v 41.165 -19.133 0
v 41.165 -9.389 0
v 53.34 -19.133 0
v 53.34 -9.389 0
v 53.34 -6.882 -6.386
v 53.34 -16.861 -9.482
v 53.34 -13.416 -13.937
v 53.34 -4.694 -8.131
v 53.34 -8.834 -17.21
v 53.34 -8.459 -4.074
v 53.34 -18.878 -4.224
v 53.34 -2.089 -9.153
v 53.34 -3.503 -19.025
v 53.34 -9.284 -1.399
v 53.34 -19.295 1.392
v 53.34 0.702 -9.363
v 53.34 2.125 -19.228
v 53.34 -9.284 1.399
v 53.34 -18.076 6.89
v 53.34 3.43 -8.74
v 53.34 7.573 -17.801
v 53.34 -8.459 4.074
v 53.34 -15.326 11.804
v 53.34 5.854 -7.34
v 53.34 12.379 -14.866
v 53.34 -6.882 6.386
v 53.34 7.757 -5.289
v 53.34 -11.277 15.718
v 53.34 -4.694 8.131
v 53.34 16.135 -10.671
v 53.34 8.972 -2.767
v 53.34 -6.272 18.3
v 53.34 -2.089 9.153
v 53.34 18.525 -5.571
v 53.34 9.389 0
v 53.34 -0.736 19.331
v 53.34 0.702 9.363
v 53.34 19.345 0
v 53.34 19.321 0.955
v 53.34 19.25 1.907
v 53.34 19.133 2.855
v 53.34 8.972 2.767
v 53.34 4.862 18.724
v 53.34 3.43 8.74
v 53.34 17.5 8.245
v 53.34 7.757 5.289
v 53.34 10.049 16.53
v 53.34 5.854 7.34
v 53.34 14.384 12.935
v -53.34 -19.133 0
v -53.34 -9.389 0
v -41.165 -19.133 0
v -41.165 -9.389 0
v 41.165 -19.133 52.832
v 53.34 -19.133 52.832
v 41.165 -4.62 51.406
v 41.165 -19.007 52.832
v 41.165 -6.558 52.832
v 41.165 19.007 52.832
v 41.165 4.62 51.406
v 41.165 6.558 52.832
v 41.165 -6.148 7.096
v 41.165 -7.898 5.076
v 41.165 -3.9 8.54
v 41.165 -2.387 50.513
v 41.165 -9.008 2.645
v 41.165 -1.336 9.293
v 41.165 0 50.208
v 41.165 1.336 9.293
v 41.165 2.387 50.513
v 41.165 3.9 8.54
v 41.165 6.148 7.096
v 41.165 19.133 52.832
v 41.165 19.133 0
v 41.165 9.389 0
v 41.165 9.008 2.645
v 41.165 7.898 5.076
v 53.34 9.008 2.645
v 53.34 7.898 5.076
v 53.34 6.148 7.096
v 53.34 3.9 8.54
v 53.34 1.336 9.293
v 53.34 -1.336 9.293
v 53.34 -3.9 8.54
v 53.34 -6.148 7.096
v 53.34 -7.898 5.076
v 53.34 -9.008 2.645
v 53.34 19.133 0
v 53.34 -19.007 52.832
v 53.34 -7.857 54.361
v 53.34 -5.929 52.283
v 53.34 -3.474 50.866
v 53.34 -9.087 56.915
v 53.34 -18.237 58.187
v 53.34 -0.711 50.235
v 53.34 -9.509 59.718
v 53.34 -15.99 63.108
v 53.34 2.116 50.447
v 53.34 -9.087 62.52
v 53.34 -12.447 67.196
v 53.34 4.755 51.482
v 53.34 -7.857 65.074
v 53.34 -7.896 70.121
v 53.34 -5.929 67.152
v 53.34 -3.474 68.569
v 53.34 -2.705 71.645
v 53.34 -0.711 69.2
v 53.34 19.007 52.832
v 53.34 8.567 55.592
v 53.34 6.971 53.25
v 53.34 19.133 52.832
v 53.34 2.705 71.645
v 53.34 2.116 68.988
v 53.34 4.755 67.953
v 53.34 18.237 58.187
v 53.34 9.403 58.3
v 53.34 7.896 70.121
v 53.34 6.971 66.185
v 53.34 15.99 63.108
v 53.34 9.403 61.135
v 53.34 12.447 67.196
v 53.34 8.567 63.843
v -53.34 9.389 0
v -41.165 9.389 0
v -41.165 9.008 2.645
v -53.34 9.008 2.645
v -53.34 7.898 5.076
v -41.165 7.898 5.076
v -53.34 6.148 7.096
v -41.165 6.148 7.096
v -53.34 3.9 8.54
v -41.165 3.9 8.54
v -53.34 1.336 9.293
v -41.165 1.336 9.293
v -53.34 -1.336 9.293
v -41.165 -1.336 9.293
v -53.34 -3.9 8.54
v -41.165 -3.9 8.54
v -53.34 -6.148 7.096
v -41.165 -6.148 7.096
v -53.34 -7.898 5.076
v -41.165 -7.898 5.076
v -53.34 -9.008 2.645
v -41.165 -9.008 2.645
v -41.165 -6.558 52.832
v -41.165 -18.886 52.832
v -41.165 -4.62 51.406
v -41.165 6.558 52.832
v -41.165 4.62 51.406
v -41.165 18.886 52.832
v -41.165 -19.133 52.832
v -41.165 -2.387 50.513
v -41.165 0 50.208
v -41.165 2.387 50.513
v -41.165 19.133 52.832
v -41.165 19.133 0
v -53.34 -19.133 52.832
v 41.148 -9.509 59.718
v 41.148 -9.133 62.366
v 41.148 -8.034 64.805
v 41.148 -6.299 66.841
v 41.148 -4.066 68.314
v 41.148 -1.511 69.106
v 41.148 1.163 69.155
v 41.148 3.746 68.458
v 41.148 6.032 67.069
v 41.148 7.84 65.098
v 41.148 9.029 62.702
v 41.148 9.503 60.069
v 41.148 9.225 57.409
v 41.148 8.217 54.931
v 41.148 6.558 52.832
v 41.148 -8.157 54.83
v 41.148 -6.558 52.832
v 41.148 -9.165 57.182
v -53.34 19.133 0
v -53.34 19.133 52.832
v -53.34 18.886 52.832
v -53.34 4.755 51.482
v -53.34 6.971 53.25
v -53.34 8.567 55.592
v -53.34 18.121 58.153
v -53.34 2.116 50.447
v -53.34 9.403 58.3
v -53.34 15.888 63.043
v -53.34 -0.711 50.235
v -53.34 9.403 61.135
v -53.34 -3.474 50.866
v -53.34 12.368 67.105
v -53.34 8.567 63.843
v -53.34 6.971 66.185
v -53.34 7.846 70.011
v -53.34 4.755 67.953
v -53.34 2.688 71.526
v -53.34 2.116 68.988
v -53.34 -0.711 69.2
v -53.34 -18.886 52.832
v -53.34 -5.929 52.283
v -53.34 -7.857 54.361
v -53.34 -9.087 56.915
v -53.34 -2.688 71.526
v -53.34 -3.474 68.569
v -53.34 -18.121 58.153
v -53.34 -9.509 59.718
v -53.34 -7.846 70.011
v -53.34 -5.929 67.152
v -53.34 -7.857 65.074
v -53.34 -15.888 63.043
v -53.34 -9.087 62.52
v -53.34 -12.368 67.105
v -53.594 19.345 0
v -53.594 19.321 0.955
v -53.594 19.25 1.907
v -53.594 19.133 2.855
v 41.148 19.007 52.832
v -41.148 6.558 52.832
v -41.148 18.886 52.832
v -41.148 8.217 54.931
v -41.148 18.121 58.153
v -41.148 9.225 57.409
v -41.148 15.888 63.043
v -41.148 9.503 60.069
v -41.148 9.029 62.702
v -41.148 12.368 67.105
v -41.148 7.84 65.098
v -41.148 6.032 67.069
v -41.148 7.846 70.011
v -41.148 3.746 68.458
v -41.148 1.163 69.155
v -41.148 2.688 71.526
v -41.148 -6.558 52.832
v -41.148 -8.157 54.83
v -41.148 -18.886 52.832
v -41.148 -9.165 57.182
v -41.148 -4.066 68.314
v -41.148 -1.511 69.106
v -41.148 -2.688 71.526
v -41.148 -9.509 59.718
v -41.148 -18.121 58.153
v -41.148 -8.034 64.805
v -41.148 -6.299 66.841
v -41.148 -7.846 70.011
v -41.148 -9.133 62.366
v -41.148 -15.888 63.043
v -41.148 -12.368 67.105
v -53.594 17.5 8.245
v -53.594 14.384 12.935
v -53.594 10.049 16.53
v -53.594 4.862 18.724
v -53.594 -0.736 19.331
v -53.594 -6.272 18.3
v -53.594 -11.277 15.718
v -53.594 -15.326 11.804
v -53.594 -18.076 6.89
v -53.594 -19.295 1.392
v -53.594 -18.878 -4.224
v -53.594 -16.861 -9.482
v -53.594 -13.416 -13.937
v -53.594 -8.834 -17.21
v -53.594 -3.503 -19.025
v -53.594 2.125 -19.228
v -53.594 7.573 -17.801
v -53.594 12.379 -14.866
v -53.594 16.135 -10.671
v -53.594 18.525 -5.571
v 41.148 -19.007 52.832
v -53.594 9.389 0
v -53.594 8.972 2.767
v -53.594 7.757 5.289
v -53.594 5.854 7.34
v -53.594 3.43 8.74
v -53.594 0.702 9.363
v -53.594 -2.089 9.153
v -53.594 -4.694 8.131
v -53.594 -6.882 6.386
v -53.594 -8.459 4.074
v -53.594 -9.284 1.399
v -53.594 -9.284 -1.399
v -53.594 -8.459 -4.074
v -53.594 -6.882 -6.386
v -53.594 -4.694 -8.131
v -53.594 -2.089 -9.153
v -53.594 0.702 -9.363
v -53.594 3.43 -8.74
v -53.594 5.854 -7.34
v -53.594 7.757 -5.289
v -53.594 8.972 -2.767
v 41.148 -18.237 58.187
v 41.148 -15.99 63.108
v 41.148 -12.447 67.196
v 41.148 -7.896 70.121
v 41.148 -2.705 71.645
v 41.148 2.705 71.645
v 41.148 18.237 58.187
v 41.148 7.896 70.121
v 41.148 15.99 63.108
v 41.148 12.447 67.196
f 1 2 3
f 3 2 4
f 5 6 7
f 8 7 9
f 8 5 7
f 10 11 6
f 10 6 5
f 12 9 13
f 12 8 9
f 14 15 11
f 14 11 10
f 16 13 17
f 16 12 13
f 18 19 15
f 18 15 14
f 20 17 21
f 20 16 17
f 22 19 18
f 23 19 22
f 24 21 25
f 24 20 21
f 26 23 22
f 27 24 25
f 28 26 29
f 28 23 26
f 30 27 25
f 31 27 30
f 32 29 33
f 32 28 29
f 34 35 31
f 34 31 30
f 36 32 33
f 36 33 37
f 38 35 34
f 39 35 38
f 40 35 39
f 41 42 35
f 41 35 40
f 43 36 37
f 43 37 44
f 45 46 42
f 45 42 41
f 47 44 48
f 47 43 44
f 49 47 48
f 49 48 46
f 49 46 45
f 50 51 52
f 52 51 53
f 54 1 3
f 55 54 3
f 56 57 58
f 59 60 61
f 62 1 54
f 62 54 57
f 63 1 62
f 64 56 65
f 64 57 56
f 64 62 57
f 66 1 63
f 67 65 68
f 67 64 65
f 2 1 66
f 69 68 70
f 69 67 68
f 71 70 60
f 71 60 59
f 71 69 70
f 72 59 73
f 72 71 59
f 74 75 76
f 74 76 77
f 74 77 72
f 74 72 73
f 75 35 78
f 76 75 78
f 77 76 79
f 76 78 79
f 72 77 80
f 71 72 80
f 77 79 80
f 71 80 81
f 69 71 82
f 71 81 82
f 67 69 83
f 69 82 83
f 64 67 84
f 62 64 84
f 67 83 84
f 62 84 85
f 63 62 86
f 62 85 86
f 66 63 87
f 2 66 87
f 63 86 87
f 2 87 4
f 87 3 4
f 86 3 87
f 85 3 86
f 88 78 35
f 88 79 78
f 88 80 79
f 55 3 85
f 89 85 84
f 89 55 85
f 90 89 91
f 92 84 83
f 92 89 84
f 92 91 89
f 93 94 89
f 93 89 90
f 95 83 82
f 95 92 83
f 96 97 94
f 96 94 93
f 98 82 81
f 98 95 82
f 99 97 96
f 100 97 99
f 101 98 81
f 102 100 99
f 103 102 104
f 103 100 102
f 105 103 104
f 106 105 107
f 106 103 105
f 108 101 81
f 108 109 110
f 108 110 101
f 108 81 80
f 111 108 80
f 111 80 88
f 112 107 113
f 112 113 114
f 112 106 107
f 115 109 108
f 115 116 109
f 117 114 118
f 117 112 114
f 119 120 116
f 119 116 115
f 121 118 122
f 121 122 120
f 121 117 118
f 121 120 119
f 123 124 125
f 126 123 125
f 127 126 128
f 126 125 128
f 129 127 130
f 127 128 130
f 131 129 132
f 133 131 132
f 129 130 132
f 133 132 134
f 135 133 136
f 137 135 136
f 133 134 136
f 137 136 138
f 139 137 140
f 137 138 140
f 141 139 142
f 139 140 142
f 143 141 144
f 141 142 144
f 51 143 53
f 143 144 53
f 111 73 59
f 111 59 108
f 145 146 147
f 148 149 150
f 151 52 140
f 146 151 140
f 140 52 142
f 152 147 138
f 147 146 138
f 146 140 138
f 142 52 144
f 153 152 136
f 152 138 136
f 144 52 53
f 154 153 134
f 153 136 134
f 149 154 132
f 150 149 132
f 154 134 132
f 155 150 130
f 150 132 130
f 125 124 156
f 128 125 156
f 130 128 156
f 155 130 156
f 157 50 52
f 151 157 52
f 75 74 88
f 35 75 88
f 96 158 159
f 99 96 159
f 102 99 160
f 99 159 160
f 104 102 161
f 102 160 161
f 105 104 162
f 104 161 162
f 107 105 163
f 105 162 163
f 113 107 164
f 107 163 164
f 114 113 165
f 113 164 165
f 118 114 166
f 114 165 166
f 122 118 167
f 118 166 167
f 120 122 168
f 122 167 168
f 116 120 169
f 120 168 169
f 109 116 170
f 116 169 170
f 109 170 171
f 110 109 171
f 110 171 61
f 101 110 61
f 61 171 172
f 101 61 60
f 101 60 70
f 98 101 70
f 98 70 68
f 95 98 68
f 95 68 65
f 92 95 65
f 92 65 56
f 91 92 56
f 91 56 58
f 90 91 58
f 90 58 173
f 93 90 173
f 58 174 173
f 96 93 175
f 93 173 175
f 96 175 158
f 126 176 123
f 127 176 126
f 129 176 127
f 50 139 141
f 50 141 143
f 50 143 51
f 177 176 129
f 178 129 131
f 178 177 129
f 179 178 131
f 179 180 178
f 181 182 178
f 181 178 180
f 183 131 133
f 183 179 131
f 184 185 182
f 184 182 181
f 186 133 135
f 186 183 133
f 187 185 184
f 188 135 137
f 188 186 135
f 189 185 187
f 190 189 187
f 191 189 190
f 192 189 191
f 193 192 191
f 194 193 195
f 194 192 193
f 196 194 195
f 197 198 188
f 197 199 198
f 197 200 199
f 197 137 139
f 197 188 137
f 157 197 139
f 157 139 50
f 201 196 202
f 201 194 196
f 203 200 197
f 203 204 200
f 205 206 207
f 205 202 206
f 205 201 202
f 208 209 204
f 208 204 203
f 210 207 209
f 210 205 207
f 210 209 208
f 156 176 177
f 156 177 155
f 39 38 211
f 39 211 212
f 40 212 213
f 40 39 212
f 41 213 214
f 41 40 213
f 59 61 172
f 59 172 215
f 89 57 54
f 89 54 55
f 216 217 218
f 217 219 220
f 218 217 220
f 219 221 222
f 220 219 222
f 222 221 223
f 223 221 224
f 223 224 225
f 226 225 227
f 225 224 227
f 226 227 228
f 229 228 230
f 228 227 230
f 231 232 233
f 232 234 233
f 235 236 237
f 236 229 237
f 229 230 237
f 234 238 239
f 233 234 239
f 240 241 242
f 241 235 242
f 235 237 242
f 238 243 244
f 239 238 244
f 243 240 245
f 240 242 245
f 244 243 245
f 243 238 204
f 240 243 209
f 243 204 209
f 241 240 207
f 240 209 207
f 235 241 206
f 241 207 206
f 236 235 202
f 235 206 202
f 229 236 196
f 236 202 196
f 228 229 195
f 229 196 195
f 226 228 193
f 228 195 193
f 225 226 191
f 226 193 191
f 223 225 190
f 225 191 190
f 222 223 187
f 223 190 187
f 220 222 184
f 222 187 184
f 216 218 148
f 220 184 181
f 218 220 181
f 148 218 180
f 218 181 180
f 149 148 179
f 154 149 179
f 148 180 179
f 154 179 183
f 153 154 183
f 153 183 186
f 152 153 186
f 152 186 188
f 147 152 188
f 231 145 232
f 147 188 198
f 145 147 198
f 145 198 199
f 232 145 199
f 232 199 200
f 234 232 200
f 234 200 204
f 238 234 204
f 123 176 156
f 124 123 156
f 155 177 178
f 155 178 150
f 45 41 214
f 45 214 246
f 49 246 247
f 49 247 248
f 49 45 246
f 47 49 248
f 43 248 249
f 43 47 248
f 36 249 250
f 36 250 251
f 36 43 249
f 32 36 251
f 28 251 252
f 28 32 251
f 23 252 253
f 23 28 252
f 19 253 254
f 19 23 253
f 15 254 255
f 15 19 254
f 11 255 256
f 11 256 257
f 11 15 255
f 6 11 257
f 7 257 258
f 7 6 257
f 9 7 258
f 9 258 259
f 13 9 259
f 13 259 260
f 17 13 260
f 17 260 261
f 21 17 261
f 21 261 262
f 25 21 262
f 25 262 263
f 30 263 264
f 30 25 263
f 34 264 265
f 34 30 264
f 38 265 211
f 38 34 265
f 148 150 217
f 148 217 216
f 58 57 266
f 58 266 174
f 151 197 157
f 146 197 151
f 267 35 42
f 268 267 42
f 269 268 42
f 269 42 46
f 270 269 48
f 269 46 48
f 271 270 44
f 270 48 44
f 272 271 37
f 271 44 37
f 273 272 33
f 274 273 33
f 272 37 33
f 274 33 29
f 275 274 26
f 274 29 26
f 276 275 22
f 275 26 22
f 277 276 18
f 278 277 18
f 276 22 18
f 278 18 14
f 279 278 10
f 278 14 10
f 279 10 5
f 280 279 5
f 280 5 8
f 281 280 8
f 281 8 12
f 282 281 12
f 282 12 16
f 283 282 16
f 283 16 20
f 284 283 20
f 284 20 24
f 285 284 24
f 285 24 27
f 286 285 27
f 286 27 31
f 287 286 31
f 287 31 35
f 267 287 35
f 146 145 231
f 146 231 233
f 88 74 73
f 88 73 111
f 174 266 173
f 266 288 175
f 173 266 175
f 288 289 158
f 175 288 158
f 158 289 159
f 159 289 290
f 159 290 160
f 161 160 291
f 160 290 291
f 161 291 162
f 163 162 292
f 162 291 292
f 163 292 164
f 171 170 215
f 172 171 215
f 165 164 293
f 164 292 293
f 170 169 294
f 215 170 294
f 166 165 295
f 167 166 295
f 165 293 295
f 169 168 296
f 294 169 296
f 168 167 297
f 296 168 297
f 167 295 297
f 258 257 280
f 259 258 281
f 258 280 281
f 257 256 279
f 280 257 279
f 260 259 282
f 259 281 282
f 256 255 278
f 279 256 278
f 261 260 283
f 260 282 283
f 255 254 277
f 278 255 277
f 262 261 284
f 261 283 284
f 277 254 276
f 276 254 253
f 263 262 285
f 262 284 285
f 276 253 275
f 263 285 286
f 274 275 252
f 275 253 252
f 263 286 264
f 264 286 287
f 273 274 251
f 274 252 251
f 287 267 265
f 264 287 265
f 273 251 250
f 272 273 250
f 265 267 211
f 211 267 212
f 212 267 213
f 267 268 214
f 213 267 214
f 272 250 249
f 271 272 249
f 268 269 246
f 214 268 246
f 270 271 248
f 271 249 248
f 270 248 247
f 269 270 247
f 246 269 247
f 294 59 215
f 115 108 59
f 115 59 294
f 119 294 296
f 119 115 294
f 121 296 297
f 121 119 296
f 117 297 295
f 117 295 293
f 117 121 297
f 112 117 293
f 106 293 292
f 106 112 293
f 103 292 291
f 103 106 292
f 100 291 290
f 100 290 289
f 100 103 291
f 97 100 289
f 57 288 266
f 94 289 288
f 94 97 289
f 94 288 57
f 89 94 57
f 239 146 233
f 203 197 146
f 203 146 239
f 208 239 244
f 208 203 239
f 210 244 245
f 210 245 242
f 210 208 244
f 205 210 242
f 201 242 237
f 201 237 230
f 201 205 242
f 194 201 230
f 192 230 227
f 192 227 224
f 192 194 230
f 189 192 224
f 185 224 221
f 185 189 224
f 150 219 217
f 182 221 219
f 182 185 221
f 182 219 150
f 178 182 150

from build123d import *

# Parameters (mm, degrees)
F0_W      = 12.1754333377
F0_H      = 38.2656529546
F1_DEPTH  = 52.832
F3_DEPTH  = 106.934
F5_DEPTH  = 12.192
F7_DEPTH  = 12.192
F8_R      = 9.5091420737
F9_DEPTH  = 119.126
F10_R     = 9.3887688186
F11_DEPTH = 106.935


with BuildPart() as f1:
    # F0 (on Top) → F1 (new body)
    with BuildSketch(Plane.XY):
        with Locations((47.2522825003, 0)):
            Rectangle(F0_W, F0_H)
    extrude(amount=F1_DEPTH)

    # F6 (on face) → F7 (join)
    with BuildSketch(Plane.YZ.offset(53.3399991691)):
        with BuildLine():
            Line((-19.0069244171, 52.832), (19.0069244171, 52.832))
            ThreePointArc((19.0069244171, 52.832), (0, 71.8389244171), (-19.0069244171, 52.832))
        make_face()
    extrude(amount=-F7_DEPTH)


with BuildPart() as f1b:
    # F0 (on Top) → F1, piece 2 (new body)
    with BuildSketch(Plane.XY):
        with Locations((-47.2522825003, 0)):
            Rectangle(F0_W, F0_H)
    extrude(amount=F1_DEPTH)

    # F4 (on face) → F5 (join)
    with BuildSketch(Plane(origin=(-53.3399991691, 0, 0), x_dir=(0, -1, 0), z_dir=(-1, 0, 0))):
        with BuildLine():
            Line((-18.8860917194, 52.832), (18.8860917194, 52.832))
            ThreePointArc((18.8860917194, 52.832), (0, 71.7180917194), (-18.8860917194, 52.832))
        make_face()
    extrude(amount=-F5_DEPTH)


with BuildPart() as f3:
    # F2 (on face) → F3 (new body)
    with BuildSketch(Plane.YZ.offset(53.3399991691)):
        with BuildLine():
            Line((19.1328264773, 0), (19.1328264773, 2.8551059379))
            ThreePointArc((19.1328264773, 2.8551059379), (0, 19.3446808949), (-19.1328264773, 2.8551059379))
            Line((-19.1328264773, 2.8551059379), (-19.1328264773, 0))
            Line((-19.1328264773, 0), (19.1328264773, 0))
        make_face()
        with BuildLine():
            ThreePointArc((-19.1328264773, 2.8551059379), (-1.4314775767, -19.2916445871), (19.3446808949, 0))
            ThreePointArc((19.3446808949, 0), (19.2916445871, 1.4314775767), (19.1328264773, 2.8551059379))
            Line((19.1328264773, 2.8551059379), (19.1328264773, 0))
            Line((19.1328264773, 0), (-19.1328264773, 0))
            Line((-19.1328264773, 0), (-19.1328264773, 2.8551059379))
        make_face()
    extrude(amount=-F3_DEPTH)


with BuildPart() as f9_tool:
    # F8 (on face) → F9 (new body)
    with BuildSketch(Plane(origin=(-53.3399991691, 0, 0), x_dir=(0, -1, 0), z_dir=(-1, 0, 0))):
        with Locations((0, 59.7176104784)):
            Circle(F8_R)
    extrude(amount=-F9_DEPTH)


with BuildPart() as f1_1:
    add(f1.part)

    # F9: cut by f9_tool
    add(f9_tool.part, mode=Mode.SUBTRACT)


with BuildPart() as f1b_1:
    add(f1b.part)

    # F9: cut by f9_tool
    add(f9_tool.part, mode=Mode.SUBTRACT)


with BuildPart() as f11_tool:
    # F10 (on face) → F11 (new body, through all)
    with BuildSketch(Plane.YZ.offset(53.3399991691)):
        Circle(F10_R)
    extrude(amount=-F11_DEPTH)


with BuildPart() as f1_2:
    add(f1_1.part)

    # F11: cut by f11_tool
    add(f11_tool.part, mode=Mode.SUBTRACT)


with BuildPart() as f1b_2:
    add(f1b_1.part)

    # F11: cut by f11_tool
    add(f11_tool.part, mode=Mode.SUBTRACT)


with BuildPart() as f3_1:
    add(f3.part)

    # F11: cut by f11_tool
    add(f11_tool.part, mode=Mode.SUBTRACT)


solid = Compound([f1_2.part, f1b_2.part, f3_1.part])
